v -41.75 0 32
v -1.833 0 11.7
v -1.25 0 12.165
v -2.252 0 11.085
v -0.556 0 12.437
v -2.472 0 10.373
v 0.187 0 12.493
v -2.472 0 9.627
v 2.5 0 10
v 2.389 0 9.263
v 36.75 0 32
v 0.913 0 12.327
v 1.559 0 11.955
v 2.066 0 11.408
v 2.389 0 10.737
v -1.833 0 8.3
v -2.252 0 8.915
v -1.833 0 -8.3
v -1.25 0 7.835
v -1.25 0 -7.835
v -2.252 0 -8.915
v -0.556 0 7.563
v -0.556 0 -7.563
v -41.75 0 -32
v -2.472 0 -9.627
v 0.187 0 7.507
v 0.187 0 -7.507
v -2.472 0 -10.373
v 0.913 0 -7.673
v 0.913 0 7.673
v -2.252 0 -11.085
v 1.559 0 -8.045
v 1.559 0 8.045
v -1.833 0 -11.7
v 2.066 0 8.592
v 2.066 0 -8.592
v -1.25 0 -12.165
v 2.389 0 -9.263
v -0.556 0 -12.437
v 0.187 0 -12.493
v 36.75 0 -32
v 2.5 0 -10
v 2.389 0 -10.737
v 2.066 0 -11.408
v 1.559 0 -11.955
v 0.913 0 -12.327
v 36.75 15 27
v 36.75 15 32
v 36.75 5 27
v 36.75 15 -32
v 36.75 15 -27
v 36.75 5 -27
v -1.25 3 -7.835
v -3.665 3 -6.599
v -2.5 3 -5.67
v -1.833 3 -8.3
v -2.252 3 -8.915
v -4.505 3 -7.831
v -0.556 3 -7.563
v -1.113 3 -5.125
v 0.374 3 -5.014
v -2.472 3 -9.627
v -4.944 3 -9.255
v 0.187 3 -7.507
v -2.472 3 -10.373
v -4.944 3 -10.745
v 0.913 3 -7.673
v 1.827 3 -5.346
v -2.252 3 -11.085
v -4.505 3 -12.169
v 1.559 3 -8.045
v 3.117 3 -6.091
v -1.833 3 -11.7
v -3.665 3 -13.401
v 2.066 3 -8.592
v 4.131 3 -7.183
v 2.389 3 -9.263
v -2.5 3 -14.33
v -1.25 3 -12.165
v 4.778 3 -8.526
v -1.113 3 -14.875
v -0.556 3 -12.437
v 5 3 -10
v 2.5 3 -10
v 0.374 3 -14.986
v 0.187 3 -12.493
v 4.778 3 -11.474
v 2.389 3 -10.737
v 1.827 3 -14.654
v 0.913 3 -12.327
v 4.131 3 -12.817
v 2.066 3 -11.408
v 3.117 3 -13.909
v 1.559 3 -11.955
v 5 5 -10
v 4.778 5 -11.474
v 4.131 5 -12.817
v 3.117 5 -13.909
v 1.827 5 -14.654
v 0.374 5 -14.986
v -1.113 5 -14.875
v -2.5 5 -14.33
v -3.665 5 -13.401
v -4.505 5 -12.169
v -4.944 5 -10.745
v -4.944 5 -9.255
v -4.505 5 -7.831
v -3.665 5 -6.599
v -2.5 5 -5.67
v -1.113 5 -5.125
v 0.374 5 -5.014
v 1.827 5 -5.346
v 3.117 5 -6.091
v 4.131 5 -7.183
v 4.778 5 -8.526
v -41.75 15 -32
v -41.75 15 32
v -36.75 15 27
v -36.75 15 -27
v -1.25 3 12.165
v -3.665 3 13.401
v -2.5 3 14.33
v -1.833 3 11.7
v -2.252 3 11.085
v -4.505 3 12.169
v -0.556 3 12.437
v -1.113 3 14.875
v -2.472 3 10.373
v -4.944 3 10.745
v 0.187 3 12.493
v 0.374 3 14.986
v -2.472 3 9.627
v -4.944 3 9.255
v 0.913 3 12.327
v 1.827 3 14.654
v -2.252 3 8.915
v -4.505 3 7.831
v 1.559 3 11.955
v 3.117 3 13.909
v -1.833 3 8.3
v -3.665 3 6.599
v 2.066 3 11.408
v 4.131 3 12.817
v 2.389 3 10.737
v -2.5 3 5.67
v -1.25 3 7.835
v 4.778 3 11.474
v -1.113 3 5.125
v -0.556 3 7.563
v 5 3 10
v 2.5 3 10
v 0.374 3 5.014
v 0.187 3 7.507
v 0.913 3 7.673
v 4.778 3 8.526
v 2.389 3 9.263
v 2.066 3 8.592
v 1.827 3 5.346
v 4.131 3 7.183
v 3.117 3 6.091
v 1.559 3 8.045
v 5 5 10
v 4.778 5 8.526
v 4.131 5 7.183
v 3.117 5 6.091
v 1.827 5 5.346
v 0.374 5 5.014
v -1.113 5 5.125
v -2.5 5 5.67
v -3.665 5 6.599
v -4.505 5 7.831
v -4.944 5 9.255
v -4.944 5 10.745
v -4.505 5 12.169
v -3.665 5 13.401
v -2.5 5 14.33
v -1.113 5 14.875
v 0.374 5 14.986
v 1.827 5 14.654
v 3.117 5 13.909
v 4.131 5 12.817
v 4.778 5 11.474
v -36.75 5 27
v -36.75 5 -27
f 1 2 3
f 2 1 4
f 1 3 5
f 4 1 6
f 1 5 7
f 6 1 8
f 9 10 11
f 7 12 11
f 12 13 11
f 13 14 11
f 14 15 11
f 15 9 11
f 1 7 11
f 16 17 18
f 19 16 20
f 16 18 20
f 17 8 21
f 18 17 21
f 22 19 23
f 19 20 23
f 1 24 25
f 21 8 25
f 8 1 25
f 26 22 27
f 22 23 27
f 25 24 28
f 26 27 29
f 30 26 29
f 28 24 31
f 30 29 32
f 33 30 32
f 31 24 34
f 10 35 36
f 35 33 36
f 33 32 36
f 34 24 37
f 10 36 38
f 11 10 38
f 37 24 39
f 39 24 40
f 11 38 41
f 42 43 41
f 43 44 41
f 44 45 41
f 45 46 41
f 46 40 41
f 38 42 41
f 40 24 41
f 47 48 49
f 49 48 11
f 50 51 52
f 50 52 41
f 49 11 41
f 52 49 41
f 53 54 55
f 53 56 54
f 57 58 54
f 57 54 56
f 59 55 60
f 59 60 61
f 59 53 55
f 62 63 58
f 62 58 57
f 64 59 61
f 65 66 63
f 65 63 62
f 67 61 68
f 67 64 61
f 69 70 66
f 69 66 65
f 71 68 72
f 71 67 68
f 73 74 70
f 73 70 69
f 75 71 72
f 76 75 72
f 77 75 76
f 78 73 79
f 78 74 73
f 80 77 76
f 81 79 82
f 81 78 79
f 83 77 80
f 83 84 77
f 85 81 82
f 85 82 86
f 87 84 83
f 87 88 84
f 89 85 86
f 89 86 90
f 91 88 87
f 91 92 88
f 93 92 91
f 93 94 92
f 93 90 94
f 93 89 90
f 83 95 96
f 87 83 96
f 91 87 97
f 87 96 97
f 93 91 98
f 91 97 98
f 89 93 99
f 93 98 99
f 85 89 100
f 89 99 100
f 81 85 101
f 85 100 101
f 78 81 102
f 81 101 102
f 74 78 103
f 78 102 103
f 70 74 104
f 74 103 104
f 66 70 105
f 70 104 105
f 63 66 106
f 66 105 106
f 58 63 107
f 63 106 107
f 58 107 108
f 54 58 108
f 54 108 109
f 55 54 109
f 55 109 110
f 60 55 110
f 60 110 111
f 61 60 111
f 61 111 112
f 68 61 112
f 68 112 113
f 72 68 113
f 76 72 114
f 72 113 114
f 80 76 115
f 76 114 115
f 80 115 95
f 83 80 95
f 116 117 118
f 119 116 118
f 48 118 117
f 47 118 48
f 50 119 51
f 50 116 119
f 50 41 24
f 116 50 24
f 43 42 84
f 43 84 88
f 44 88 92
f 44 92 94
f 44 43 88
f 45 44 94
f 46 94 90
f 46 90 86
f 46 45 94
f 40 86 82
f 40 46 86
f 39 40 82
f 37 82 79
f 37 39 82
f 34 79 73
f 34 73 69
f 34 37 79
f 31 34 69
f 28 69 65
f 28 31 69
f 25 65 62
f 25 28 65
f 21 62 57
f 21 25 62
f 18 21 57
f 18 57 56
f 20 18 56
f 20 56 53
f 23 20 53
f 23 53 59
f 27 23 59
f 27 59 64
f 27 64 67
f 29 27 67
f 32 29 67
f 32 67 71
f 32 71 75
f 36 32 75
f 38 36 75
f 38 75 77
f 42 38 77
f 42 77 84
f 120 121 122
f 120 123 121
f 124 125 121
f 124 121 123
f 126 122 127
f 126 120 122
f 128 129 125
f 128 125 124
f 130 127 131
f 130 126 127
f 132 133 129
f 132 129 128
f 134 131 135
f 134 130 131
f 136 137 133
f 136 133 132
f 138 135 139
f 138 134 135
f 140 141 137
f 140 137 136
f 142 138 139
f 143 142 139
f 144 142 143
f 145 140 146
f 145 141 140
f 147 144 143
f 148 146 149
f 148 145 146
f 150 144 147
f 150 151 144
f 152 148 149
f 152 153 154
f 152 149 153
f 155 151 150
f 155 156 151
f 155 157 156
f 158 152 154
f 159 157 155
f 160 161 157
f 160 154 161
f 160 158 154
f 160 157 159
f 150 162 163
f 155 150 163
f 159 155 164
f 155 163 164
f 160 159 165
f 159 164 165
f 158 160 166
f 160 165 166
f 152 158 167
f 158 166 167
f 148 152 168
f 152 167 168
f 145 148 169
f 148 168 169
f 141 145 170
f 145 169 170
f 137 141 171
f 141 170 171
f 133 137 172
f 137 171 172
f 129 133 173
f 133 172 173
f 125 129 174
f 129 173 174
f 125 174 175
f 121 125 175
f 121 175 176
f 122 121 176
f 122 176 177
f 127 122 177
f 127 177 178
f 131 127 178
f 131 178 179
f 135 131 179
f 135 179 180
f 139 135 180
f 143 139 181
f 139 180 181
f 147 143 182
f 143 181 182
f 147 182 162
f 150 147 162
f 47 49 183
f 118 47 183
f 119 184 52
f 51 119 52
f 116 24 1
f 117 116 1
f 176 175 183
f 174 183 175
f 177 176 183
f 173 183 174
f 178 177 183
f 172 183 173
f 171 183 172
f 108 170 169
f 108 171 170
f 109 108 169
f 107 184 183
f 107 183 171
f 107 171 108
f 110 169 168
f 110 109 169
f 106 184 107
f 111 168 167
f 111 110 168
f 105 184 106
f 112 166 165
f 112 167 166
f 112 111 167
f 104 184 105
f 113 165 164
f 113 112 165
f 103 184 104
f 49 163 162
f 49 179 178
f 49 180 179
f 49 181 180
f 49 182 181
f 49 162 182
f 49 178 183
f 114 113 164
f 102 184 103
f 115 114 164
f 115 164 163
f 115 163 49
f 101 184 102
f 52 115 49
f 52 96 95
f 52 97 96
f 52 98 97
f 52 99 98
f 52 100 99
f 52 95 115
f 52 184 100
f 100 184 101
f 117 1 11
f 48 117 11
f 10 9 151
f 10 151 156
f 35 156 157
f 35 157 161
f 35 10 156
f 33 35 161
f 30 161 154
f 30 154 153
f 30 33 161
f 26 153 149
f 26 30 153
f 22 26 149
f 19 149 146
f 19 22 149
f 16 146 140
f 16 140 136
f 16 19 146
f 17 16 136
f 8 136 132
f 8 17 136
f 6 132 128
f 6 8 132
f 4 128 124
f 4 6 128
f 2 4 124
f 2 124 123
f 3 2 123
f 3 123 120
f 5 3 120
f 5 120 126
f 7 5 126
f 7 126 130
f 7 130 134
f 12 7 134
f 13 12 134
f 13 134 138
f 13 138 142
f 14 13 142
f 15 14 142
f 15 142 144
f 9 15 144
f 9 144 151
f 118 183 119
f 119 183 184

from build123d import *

# Parameters (mm, degrees)
SKETCH3_W               = 73.5
SKETCH3_H               = 54
BOSS_EXTRUDE2_DEPTH     = 5
BOSS_EXTRUDE4_DEPTH     = 15
SKETCH6_R               = 5
SKETCH6_R_2             = 2.5
CUT_EXTRUDE4_DEPTH      = 2
SKETCH1_R               = 2.5
CUT_EXTRUDE5_DEPTH      = 10
CUT_EXTRUDE5_DEPTH_BACK = 1
SKETCH1_7_R             = 2.5
CUT_EXTRUDE6_DEPTH      = 10


with BuildPart() as part:
    # Sketch3 → Boss-Extrude2 (new body)
    with BuildSketch(Plane(origin=(0, 0, 0), x_dir=(1, 0, 0), z_dir=(0, 1, 0))):
        Rectangle(SKETCH3_W, SKETCH3_H)
    extrude(amount=BOSS_EXTRUDE2_DEPTH)

    # Sketch4 → Boss-Extrude4 (add)
    with BuildSketch(Plane(origin=(0, 0, 0), x_dir=(1, 0, 0), z_dir=(0, 1, 0))):
        Polygon((36.75, 32), (-41.75, 32), (-41.75, -32), (36.75, -32), (36.75, -27), (-36.75, -27), (-36.75, 27), (36.75, 27), align=None)
    extrude(amount=BOSS_EXTRUDE4_DEPTH)

    # Sketch6 → Cut-Extrude4 (cut)
    with BuildSketch(Plane(origin=(0, 5, 0), x_dir=(1, 0, 0), z_dir=(0, 1, 0))):
        with Locations((0, 10)):
            Circle(SKETCH6_R)
        with Locations((0, 10)):
            Circle(SKETCH6_R_2, mode=Mode.SUBTRACT)
        with Locations((0, -10)):
            Circle(SKETCH6_R)
        with Locations((0, -10)):
            Circle(SKETCH6_R_2, mode=Mode.SUBTRACT)
    extrude(amount=-CUT_EXTRUDE4_DEPTH, mode=Mode.SUBTRACT)

    # Sketch1 → Cut-Extrude5 (cut, two sides)
    with BuildSketch(Plane(origin=(0, 0, 0), x_dir=(1, 0, 0), z_dir=(0, 1, 0))) as cut_extrude5_sk:
        with Locations((0, 10)):
            Circle(SKETCH1_R)
    extrude(amount=CUT_EXTRUDE5_DEPTH, mode=Mode.SUBTRACT)
    extrude(cut_extrude5_sk.sketch, amount=-CUT_EXTRUDE5_DEPTH_BACK, mode=Mode.SUBTRACT)

    # Sketch1<7> → Cut-Extrude6 (cut)
    with BuildSketch(Plane(origin=(0, 0, 0), x_dir=(1, 0, 0), z_dir=(0, 1, 0))):
        with Locations((0, -10)):
            Circle(SKETCH1_7_R)
    extrude(amount=CUT_EXTRUDE6_DEPTH, mode=Mode.SUBTRACT)


solid = part.part
